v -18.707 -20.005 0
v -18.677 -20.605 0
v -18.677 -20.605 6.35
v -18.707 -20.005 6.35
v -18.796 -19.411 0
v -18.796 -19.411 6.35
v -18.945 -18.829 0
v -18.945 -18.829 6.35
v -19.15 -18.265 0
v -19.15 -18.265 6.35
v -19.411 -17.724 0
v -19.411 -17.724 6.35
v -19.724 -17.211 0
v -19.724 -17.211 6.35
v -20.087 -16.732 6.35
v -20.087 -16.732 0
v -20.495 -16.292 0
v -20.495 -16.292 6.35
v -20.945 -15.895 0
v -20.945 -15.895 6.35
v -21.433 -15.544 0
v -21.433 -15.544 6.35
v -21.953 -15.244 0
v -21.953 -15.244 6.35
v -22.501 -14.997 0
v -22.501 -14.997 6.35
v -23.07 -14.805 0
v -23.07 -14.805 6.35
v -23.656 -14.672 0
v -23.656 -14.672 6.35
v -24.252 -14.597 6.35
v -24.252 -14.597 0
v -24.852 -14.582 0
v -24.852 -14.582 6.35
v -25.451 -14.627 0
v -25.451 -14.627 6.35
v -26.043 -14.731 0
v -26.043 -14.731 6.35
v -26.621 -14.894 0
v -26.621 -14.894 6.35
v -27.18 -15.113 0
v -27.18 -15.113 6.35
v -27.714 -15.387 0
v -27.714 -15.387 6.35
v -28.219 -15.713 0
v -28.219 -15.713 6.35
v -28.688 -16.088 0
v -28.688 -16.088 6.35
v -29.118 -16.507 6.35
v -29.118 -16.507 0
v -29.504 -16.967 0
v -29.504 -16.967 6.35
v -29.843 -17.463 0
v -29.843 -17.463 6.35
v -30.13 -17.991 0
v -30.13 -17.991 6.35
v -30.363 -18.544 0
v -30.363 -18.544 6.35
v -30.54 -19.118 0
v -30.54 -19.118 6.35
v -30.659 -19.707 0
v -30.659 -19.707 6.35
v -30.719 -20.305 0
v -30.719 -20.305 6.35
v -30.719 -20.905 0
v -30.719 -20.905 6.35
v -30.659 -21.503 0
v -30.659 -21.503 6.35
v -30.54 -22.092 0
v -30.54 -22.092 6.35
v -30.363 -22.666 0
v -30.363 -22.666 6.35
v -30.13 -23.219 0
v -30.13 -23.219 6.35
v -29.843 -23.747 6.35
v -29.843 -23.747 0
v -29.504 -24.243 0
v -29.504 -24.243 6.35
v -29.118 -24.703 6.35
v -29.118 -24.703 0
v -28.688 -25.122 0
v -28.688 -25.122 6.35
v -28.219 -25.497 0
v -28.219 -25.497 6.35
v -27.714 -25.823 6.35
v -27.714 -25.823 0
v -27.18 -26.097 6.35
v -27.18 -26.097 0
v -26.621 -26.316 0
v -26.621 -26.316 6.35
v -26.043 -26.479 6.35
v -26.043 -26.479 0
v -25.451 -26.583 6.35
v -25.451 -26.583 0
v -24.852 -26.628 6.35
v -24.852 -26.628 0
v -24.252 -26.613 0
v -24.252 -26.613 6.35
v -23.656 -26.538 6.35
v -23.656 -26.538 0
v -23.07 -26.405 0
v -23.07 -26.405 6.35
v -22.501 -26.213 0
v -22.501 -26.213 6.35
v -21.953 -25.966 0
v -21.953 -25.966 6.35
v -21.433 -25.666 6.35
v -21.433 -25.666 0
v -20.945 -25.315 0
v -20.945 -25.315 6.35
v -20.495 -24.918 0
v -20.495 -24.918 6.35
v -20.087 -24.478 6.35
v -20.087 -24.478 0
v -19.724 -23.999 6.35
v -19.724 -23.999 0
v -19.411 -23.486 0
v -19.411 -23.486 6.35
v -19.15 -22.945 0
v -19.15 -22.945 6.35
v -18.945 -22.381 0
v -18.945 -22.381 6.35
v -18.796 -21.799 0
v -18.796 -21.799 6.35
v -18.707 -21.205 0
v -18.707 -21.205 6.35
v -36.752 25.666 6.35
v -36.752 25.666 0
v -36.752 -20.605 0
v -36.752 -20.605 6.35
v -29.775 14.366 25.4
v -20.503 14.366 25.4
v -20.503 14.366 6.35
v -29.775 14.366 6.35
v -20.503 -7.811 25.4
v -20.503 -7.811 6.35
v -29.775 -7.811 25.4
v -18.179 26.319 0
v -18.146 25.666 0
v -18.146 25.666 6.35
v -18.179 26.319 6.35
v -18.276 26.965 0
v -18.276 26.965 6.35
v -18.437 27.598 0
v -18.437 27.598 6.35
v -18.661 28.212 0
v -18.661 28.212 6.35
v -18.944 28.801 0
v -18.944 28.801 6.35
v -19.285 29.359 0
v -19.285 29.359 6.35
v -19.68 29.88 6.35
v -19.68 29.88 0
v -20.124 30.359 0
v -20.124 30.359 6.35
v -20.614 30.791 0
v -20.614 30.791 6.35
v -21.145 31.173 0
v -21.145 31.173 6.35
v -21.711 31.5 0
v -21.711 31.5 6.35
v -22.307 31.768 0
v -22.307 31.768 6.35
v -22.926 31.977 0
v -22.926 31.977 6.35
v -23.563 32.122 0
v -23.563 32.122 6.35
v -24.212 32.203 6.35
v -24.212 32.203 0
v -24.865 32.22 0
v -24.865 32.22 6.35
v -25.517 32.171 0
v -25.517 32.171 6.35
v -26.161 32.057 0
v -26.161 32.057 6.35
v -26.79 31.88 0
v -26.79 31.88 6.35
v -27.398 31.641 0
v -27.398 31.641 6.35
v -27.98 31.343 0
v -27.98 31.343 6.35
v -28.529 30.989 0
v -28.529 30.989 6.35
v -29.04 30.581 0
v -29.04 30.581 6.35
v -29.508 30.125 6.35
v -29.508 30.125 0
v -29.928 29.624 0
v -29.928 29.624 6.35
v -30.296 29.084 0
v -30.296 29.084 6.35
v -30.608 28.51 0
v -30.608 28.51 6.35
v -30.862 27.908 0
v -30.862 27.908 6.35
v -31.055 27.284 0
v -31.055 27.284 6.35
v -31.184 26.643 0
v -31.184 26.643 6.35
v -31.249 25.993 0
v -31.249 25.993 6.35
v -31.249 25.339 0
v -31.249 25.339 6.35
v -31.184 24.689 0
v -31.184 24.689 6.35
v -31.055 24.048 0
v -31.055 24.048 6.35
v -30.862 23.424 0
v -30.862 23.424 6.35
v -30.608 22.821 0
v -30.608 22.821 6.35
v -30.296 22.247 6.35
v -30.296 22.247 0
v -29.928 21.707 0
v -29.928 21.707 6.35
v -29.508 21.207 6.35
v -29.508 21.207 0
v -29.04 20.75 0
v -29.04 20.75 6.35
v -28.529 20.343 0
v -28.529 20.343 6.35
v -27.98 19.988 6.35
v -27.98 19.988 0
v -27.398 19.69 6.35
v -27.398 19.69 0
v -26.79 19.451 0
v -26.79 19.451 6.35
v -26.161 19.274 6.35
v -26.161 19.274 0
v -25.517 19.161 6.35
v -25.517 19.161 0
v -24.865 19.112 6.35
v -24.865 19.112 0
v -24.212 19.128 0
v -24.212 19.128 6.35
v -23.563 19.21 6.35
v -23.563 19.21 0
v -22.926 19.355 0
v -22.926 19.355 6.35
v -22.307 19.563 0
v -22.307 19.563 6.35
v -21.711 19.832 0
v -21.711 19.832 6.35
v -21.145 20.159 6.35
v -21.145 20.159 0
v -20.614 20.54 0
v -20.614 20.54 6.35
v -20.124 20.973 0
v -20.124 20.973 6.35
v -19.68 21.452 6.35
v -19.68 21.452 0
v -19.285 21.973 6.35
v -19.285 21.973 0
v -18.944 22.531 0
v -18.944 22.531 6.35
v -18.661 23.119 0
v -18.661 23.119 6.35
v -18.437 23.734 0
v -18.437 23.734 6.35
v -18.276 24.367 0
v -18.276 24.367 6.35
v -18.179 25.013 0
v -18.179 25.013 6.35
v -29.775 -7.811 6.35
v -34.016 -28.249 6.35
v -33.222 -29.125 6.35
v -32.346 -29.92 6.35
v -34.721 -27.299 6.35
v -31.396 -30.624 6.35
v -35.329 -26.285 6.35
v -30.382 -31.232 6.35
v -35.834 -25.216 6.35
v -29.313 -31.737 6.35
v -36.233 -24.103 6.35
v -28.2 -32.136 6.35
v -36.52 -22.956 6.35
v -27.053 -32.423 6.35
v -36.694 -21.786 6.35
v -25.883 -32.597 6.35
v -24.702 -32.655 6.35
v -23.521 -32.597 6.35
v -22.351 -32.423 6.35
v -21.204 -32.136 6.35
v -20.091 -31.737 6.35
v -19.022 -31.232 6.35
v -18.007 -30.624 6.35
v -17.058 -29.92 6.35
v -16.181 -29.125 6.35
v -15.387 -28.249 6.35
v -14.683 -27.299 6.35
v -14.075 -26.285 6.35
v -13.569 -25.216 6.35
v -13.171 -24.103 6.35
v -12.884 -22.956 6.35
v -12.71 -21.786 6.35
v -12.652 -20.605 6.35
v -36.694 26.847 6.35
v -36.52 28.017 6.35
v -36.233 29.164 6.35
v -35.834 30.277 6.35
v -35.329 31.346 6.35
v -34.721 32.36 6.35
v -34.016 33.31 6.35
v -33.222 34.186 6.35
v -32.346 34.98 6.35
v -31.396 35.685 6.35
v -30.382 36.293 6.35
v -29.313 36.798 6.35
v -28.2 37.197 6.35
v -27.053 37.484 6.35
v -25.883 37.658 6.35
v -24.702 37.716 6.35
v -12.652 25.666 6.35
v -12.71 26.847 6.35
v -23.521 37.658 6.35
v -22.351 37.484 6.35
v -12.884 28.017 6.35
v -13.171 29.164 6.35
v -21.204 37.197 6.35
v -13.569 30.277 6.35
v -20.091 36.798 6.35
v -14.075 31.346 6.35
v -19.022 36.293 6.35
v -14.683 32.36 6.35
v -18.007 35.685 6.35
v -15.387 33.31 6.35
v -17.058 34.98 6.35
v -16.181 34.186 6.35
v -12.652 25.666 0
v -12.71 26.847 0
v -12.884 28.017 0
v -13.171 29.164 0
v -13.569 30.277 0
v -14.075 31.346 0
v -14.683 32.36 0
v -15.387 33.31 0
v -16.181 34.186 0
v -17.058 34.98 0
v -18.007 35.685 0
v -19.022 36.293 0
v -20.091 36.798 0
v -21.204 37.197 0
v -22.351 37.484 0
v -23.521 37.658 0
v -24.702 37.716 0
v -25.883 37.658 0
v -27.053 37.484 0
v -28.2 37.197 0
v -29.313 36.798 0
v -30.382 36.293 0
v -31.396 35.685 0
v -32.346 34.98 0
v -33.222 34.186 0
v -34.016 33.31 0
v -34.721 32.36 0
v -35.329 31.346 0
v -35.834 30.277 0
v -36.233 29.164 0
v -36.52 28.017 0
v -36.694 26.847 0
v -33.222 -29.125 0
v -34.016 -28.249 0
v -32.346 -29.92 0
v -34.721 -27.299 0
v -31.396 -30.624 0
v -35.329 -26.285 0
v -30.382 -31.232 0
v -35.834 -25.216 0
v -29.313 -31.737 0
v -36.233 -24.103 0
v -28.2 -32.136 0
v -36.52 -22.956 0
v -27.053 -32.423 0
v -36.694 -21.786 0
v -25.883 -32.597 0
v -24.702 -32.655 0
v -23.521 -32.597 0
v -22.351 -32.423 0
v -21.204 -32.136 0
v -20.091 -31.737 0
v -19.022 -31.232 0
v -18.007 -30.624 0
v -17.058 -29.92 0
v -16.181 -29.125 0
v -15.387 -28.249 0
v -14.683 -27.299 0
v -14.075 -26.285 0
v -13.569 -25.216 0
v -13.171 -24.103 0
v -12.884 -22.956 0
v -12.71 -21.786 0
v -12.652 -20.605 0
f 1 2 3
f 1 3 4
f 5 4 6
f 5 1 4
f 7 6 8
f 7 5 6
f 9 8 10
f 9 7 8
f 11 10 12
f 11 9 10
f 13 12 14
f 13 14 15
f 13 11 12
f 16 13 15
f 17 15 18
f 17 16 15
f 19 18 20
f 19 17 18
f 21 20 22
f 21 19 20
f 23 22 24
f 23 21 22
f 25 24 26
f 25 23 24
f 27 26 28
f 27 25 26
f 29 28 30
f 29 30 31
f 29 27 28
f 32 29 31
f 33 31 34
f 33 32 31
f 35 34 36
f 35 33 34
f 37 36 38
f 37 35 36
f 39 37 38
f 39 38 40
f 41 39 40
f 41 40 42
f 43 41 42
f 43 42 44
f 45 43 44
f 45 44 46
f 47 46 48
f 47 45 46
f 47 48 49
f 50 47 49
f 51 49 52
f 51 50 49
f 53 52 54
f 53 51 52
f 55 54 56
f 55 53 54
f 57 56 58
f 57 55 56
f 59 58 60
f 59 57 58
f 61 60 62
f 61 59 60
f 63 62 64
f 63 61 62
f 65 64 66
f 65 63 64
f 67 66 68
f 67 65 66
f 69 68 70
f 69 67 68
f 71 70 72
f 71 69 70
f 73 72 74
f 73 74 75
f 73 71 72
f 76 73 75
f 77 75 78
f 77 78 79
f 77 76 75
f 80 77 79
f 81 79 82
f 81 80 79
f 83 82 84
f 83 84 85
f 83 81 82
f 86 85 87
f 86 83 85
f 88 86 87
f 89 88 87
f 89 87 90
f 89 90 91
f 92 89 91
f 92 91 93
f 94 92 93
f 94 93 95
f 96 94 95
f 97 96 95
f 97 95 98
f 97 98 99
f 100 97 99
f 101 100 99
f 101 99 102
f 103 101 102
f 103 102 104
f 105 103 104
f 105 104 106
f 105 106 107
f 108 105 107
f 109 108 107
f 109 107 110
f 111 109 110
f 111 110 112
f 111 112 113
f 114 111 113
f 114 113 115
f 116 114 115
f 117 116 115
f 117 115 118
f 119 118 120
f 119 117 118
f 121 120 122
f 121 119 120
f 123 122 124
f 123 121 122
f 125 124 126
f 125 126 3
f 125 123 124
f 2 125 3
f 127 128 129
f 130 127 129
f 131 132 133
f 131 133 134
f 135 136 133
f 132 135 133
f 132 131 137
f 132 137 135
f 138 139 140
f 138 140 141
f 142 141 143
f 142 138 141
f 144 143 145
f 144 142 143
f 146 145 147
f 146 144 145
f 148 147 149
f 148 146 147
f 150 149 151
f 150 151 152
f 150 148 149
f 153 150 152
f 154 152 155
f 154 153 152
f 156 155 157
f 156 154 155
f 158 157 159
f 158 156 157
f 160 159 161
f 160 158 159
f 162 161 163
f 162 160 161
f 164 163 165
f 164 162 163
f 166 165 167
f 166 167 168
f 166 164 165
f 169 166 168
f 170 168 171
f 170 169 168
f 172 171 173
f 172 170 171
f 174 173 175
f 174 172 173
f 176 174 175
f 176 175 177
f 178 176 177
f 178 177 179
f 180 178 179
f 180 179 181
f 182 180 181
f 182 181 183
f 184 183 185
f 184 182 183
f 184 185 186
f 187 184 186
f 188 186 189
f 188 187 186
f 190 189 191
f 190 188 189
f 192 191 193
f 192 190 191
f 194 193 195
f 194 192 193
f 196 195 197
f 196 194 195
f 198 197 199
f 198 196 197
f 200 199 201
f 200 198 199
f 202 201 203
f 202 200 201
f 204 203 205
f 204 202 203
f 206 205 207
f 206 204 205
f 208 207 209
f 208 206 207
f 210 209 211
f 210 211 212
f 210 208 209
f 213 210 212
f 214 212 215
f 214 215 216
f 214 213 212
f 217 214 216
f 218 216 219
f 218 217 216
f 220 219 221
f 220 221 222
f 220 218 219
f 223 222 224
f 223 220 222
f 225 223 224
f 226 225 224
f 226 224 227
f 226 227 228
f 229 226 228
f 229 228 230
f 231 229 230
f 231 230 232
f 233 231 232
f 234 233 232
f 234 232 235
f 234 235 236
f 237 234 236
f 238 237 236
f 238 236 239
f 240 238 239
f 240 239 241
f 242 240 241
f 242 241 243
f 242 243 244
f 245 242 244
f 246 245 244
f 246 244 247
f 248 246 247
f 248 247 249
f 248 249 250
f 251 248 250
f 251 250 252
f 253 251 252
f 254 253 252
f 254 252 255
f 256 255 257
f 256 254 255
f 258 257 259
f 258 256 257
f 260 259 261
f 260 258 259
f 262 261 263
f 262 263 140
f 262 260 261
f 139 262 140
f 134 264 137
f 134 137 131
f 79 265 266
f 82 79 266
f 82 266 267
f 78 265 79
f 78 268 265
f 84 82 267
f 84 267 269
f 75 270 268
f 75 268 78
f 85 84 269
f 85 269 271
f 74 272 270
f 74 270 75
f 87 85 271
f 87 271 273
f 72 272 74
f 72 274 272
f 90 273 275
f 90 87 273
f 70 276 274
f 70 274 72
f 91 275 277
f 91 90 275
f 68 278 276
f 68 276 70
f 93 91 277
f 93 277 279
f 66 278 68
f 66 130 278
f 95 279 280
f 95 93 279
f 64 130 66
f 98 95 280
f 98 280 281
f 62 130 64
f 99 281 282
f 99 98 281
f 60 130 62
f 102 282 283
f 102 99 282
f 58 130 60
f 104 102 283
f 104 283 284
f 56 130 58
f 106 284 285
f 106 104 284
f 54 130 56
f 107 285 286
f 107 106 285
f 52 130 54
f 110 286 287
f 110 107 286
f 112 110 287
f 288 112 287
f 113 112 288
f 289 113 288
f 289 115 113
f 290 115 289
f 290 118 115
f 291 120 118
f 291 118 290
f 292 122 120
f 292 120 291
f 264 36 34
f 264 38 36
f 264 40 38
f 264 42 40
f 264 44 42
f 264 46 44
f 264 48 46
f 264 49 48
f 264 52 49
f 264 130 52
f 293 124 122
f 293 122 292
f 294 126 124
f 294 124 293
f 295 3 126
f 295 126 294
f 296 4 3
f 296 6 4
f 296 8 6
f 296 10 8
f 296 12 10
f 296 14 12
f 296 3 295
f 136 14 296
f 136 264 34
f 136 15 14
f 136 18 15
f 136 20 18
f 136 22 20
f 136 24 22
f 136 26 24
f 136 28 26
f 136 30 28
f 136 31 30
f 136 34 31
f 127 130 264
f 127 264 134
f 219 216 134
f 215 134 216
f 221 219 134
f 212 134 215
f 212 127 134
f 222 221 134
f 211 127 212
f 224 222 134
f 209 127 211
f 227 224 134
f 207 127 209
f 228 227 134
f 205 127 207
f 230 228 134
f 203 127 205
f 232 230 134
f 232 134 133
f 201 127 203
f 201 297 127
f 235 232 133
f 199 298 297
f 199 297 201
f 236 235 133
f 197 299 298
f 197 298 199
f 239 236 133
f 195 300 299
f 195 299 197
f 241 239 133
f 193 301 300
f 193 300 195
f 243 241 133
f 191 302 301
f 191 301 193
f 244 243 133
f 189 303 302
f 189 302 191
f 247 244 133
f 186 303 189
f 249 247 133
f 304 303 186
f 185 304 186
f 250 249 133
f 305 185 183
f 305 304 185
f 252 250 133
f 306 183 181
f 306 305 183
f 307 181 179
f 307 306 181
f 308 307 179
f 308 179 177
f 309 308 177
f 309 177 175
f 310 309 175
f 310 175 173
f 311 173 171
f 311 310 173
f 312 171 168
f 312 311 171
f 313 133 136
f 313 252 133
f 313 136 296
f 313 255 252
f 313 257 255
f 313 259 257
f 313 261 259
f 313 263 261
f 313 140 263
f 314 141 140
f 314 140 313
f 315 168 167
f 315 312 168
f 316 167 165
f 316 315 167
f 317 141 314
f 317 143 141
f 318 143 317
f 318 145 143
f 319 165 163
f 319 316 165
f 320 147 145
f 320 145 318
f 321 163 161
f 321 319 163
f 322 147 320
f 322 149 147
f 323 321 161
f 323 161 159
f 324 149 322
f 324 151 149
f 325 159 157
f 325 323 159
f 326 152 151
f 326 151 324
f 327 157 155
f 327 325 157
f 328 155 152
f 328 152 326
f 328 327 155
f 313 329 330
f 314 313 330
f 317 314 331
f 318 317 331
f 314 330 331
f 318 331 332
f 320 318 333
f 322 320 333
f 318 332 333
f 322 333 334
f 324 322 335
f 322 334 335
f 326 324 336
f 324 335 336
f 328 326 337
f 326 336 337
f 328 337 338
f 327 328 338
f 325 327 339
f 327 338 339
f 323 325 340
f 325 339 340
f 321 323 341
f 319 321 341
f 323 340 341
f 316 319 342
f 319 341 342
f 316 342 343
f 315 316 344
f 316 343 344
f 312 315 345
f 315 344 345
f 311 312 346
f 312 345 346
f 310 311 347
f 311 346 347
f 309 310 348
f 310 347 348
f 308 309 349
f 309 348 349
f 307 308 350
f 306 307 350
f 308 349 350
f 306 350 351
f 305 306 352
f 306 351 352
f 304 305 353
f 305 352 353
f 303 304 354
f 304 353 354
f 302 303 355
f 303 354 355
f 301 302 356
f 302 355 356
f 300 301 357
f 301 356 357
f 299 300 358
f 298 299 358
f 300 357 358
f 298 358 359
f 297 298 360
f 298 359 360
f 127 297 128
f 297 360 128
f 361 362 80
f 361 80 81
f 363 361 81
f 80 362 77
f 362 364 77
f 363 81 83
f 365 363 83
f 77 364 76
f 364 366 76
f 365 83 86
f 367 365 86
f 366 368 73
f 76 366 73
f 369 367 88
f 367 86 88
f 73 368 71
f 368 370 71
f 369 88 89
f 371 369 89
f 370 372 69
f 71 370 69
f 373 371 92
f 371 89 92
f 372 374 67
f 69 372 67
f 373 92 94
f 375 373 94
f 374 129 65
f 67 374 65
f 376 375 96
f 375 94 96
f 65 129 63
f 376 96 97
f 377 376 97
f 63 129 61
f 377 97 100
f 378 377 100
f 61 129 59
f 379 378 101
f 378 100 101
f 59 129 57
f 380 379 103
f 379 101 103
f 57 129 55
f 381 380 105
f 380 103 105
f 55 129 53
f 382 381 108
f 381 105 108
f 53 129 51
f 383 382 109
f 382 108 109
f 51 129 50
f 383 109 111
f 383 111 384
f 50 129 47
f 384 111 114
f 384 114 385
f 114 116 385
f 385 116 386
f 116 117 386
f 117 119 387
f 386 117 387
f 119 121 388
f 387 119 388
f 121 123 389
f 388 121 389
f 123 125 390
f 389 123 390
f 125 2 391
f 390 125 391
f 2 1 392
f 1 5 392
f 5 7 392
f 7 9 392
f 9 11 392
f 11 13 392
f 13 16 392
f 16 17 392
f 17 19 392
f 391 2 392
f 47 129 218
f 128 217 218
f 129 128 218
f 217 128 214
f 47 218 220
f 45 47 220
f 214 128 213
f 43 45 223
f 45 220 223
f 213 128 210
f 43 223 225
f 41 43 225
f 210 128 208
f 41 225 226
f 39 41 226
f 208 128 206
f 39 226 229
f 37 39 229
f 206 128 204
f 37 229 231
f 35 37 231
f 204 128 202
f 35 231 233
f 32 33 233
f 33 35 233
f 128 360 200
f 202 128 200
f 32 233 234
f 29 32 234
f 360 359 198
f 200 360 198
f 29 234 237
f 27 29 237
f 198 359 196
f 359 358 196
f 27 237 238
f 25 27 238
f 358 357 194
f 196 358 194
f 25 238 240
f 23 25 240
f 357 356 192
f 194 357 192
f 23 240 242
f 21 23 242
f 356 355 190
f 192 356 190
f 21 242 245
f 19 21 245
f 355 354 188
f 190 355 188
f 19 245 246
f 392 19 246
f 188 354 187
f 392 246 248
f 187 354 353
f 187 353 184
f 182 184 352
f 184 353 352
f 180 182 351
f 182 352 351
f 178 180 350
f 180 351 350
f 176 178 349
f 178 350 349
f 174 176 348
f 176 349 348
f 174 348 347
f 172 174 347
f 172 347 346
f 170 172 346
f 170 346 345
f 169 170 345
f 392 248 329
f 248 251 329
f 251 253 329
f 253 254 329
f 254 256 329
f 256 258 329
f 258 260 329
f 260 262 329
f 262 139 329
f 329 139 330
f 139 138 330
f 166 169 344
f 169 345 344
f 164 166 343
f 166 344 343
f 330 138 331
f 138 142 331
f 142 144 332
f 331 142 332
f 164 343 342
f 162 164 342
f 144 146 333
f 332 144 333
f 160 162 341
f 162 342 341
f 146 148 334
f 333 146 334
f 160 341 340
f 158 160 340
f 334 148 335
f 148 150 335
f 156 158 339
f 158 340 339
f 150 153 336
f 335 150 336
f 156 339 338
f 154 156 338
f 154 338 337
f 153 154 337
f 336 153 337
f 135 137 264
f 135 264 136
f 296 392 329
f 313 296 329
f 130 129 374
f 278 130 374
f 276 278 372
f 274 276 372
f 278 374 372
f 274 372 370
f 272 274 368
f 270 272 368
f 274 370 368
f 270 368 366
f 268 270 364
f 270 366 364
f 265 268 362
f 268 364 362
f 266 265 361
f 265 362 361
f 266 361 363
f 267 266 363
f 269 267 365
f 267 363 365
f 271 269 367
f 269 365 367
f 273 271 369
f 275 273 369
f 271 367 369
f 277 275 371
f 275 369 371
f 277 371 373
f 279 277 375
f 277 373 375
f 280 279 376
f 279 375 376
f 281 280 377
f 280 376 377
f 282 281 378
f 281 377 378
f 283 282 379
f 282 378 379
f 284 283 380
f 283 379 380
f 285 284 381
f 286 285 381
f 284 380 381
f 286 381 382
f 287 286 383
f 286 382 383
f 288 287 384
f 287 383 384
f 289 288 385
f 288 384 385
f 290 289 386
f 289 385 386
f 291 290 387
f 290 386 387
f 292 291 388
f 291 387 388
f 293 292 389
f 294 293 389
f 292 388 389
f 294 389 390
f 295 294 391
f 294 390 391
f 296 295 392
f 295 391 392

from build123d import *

# Parameters (mm, degrees)
F0_R     = 6.0248478502
F0_R_2   = 6.5557456881
F1_DEPTH = 6.35
F0_W     = 4.6359449625
F0_H     = 22.1776319668
F2_DEPTH = 25.4


with BuildPart() as f1:
    # F0 (on Top) → F1 (new body)
    with BuildSketch(Plane.XY):
        with BuildLine():
            ThreePointArc((-12.6521838829, 25.6658587605), (-24.7018816881, 37.7155565657), (-36.7515794933, 25.6658587605))
            Line((-36.7515794933, 25.6658587605), (-36.7515794933, -20.6049848348))
            ThreePointArc((-36.7515794933, -20.6049848348), (-24.7018816881, -32.65468264), (-12.6521838829, -20.6049848348))
            Line((-12.6521838829, -20.6049848348), (-12.6521838829, 25.6658587605))
        make_face()
        with Locations((-24.7018816881, -20.6049848348)):
            Circle(F0_R, mode=Mode.SUBTRACT)
        Polygon((-25.1393578947, 14.3663082272), (-20.5034129322, 14.3663082272), (-20.5034129322, -7.8113237396), (-25.1393578947, -7.8113237396), (-29.7753028572, -7.8113237396), (-29.7753028572, 14.3663082272), align=None, mode=Mode.SUBTRACT)
        with Locations((-24.7018816881, 25.6658587605)):
            Circle(F0_R_2, mode=Mode.SUBTRACT)
    extrude(amount=F1_DEPTH)

    # F0 (on Top) → F2 (join)
    with BuildSketch(Plane.XY):
        with Locations((-22.8213854134, 3.2774922438)):
            Rectangle(F0_W, F0_H)
        with Locations((-27.4573303759, 3.2774922438)):
            Rectangle(F0_W, F0_H)
    extrude(amount=F2_DEPTH)


solid = f1.part
